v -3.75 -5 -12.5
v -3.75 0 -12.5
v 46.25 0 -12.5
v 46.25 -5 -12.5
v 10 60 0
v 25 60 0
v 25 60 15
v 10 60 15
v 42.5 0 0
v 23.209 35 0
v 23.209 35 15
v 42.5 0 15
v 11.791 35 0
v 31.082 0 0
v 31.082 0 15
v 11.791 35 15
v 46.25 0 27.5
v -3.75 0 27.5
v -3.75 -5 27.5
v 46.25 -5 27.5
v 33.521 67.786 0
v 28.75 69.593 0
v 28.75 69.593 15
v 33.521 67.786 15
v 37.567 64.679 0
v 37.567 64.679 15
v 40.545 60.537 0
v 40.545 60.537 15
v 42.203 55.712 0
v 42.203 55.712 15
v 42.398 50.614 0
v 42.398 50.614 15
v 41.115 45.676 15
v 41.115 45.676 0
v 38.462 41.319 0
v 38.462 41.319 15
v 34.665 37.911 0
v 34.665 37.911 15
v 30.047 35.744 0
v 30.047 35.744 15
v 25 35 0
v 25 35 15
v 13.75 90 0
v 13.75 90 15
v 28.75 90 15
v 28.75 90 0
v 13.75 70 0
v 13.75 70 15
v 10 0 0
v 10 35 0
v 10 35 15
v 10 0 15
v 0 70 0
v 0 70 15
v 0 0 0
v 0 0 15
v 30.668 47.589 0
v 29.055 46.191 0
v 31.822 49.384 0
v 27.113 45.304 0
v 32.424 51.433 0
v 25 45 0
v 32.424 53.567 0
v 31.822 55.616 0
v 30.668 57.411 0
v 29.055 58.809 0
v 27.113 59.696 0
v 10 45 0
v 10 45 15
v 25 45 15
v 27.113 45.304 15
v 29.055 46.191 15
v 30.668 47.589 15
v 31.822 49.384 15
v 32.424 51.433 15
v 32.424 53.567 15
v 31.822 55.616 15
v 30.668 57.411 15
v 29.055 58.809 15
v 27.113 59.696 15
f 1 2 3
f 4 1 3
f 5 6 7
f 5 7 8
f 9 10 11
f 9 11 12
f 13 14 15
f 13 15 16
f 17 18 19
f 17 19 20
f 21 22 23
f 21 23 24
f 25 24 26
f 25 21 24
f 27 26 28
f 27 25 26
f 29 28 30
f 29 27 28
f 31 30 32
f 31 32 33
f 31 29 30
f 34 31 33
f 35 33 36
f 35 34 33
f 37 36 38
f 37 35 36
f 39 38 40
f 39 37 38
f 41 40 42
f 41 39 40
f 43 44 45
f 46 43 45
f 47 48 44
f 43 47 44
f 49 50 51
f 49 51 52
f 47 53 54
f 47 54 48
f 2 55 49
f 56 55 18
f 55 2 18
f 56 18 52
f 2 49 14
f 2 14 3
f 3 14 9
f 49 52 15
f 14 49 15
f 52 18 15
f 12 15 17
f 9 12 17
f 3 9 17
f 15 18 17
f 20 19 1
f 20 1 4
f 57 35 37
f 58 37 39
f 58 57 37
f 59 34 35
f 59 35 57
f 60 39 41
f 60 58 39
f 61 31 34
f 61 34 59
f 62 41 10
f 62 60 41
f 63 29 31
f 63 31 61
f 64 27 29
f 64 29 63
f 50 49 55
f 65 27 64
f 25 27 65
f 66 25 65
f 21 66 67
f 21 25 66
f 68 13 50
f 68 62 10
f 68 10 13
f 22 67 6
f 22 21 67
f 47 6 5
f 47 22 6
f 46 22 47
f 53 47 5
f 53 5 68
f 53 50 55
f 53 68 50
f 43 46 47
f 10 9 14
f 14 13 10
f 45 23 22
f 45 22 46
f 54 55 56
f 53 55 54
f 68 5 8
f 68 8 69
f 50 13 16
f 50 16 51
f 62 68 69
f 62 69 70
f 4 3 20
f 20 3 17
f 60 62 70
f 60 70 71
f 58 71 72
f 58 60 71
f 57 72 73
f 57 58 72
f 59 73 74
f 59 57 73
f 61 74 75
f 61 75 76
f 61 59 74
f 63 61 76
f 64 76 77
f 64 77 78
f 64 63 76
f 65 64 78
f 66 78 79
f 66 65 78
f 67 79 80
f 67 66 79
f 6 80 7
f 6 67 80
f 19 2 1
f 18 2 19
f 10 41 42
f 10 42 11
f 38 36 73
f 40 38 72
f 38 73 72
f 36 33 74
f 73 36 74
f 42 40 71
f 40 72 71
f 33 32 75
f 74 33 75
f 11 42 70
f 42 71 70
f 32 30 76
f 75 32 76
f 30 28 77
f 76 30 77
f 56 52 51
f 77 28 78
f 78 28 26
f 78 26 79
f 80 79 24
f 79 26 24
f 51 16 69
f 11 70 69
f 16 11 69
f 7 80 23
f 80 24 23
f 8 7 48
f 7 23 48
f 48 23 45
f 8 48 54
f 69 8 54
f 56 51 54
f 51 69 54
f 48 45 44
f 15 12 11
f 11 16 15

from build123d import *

# Parameters (mm, degrees)
AUFSATZ_LINEAR_AUSTRAGEN1_DEPTH = 15
SKIZZE2_W                       = 50
SKIZZE2_H                       = 40
AUFSATZ_LINEAR_AUSTRAGEN2_DEPTH = 5
SKIZZE6_W                       = 15
SKIZZE6_H                       = 20.406507086
AUFSATZ_LINEAR_AUSTRAGEN3_DEPTH = 15


with BuildPart() as part:
    # Skizze1 → Aufsatz-Linear austragen1 (new body)
    with BuildSketch(Plane.XY):
        with BuildLine():
            Line((0, 0), (0, 70))
            Line((0, 70), (25, 70))
            ThreePointArc((25, 70), (42.5, 52.5), (25, 35))
            Line((25, 35), (23.209169398, 35))
            Line((23.209169398, 35), (42.5, 0))
            Line((42.5, 0), (31.081661205, 0))
            Line((31.081661205, 0), (11.790830602, 35))
            Line((11.790830602, 35), (10, 35))
            Line((10, 35), (10, 0))
            Line((10, 0), (0, 0))
        make_face()
        with BuildLine():
            Line((10, 60), (10, 45))
            Line((10, 45), (25, 45))
            ThreePointArc((25, 45), (32.5, 52.5), (25, 60))
            Line((25, 60), (10, 60))
        make_face(mode=Mode.SUBTRACT)
    extrude(amount=AUFSATZ_LINEAR_AUSTRAGEN1_DEPTH)

    # Skizze2 → Aufsatz-Linear austragen2 (add)
    with BuildSketch(Plane.XZ):
        with Locations((21.25, 7.5)):
            Rectangle(SKIZZE2_W, SKIZZE2_H)
    extrude(amount=AUFSATZ_LINEAR_AUSTRAGEN2_DEPTH)

    # Skizze6 → Aufsatz-Linear austragen3 (add)
    with BuildSketch(Plane.XY.offset(15)):
        with Locations((21.25, 79.796746457)):
            Rectangle(SKIZZE6_W, SKIZZE6_H)
    extrude(amount=-AUFSATZ_LINEAR_AUSTRAGEN3_DEPTH)


solid = part.part
